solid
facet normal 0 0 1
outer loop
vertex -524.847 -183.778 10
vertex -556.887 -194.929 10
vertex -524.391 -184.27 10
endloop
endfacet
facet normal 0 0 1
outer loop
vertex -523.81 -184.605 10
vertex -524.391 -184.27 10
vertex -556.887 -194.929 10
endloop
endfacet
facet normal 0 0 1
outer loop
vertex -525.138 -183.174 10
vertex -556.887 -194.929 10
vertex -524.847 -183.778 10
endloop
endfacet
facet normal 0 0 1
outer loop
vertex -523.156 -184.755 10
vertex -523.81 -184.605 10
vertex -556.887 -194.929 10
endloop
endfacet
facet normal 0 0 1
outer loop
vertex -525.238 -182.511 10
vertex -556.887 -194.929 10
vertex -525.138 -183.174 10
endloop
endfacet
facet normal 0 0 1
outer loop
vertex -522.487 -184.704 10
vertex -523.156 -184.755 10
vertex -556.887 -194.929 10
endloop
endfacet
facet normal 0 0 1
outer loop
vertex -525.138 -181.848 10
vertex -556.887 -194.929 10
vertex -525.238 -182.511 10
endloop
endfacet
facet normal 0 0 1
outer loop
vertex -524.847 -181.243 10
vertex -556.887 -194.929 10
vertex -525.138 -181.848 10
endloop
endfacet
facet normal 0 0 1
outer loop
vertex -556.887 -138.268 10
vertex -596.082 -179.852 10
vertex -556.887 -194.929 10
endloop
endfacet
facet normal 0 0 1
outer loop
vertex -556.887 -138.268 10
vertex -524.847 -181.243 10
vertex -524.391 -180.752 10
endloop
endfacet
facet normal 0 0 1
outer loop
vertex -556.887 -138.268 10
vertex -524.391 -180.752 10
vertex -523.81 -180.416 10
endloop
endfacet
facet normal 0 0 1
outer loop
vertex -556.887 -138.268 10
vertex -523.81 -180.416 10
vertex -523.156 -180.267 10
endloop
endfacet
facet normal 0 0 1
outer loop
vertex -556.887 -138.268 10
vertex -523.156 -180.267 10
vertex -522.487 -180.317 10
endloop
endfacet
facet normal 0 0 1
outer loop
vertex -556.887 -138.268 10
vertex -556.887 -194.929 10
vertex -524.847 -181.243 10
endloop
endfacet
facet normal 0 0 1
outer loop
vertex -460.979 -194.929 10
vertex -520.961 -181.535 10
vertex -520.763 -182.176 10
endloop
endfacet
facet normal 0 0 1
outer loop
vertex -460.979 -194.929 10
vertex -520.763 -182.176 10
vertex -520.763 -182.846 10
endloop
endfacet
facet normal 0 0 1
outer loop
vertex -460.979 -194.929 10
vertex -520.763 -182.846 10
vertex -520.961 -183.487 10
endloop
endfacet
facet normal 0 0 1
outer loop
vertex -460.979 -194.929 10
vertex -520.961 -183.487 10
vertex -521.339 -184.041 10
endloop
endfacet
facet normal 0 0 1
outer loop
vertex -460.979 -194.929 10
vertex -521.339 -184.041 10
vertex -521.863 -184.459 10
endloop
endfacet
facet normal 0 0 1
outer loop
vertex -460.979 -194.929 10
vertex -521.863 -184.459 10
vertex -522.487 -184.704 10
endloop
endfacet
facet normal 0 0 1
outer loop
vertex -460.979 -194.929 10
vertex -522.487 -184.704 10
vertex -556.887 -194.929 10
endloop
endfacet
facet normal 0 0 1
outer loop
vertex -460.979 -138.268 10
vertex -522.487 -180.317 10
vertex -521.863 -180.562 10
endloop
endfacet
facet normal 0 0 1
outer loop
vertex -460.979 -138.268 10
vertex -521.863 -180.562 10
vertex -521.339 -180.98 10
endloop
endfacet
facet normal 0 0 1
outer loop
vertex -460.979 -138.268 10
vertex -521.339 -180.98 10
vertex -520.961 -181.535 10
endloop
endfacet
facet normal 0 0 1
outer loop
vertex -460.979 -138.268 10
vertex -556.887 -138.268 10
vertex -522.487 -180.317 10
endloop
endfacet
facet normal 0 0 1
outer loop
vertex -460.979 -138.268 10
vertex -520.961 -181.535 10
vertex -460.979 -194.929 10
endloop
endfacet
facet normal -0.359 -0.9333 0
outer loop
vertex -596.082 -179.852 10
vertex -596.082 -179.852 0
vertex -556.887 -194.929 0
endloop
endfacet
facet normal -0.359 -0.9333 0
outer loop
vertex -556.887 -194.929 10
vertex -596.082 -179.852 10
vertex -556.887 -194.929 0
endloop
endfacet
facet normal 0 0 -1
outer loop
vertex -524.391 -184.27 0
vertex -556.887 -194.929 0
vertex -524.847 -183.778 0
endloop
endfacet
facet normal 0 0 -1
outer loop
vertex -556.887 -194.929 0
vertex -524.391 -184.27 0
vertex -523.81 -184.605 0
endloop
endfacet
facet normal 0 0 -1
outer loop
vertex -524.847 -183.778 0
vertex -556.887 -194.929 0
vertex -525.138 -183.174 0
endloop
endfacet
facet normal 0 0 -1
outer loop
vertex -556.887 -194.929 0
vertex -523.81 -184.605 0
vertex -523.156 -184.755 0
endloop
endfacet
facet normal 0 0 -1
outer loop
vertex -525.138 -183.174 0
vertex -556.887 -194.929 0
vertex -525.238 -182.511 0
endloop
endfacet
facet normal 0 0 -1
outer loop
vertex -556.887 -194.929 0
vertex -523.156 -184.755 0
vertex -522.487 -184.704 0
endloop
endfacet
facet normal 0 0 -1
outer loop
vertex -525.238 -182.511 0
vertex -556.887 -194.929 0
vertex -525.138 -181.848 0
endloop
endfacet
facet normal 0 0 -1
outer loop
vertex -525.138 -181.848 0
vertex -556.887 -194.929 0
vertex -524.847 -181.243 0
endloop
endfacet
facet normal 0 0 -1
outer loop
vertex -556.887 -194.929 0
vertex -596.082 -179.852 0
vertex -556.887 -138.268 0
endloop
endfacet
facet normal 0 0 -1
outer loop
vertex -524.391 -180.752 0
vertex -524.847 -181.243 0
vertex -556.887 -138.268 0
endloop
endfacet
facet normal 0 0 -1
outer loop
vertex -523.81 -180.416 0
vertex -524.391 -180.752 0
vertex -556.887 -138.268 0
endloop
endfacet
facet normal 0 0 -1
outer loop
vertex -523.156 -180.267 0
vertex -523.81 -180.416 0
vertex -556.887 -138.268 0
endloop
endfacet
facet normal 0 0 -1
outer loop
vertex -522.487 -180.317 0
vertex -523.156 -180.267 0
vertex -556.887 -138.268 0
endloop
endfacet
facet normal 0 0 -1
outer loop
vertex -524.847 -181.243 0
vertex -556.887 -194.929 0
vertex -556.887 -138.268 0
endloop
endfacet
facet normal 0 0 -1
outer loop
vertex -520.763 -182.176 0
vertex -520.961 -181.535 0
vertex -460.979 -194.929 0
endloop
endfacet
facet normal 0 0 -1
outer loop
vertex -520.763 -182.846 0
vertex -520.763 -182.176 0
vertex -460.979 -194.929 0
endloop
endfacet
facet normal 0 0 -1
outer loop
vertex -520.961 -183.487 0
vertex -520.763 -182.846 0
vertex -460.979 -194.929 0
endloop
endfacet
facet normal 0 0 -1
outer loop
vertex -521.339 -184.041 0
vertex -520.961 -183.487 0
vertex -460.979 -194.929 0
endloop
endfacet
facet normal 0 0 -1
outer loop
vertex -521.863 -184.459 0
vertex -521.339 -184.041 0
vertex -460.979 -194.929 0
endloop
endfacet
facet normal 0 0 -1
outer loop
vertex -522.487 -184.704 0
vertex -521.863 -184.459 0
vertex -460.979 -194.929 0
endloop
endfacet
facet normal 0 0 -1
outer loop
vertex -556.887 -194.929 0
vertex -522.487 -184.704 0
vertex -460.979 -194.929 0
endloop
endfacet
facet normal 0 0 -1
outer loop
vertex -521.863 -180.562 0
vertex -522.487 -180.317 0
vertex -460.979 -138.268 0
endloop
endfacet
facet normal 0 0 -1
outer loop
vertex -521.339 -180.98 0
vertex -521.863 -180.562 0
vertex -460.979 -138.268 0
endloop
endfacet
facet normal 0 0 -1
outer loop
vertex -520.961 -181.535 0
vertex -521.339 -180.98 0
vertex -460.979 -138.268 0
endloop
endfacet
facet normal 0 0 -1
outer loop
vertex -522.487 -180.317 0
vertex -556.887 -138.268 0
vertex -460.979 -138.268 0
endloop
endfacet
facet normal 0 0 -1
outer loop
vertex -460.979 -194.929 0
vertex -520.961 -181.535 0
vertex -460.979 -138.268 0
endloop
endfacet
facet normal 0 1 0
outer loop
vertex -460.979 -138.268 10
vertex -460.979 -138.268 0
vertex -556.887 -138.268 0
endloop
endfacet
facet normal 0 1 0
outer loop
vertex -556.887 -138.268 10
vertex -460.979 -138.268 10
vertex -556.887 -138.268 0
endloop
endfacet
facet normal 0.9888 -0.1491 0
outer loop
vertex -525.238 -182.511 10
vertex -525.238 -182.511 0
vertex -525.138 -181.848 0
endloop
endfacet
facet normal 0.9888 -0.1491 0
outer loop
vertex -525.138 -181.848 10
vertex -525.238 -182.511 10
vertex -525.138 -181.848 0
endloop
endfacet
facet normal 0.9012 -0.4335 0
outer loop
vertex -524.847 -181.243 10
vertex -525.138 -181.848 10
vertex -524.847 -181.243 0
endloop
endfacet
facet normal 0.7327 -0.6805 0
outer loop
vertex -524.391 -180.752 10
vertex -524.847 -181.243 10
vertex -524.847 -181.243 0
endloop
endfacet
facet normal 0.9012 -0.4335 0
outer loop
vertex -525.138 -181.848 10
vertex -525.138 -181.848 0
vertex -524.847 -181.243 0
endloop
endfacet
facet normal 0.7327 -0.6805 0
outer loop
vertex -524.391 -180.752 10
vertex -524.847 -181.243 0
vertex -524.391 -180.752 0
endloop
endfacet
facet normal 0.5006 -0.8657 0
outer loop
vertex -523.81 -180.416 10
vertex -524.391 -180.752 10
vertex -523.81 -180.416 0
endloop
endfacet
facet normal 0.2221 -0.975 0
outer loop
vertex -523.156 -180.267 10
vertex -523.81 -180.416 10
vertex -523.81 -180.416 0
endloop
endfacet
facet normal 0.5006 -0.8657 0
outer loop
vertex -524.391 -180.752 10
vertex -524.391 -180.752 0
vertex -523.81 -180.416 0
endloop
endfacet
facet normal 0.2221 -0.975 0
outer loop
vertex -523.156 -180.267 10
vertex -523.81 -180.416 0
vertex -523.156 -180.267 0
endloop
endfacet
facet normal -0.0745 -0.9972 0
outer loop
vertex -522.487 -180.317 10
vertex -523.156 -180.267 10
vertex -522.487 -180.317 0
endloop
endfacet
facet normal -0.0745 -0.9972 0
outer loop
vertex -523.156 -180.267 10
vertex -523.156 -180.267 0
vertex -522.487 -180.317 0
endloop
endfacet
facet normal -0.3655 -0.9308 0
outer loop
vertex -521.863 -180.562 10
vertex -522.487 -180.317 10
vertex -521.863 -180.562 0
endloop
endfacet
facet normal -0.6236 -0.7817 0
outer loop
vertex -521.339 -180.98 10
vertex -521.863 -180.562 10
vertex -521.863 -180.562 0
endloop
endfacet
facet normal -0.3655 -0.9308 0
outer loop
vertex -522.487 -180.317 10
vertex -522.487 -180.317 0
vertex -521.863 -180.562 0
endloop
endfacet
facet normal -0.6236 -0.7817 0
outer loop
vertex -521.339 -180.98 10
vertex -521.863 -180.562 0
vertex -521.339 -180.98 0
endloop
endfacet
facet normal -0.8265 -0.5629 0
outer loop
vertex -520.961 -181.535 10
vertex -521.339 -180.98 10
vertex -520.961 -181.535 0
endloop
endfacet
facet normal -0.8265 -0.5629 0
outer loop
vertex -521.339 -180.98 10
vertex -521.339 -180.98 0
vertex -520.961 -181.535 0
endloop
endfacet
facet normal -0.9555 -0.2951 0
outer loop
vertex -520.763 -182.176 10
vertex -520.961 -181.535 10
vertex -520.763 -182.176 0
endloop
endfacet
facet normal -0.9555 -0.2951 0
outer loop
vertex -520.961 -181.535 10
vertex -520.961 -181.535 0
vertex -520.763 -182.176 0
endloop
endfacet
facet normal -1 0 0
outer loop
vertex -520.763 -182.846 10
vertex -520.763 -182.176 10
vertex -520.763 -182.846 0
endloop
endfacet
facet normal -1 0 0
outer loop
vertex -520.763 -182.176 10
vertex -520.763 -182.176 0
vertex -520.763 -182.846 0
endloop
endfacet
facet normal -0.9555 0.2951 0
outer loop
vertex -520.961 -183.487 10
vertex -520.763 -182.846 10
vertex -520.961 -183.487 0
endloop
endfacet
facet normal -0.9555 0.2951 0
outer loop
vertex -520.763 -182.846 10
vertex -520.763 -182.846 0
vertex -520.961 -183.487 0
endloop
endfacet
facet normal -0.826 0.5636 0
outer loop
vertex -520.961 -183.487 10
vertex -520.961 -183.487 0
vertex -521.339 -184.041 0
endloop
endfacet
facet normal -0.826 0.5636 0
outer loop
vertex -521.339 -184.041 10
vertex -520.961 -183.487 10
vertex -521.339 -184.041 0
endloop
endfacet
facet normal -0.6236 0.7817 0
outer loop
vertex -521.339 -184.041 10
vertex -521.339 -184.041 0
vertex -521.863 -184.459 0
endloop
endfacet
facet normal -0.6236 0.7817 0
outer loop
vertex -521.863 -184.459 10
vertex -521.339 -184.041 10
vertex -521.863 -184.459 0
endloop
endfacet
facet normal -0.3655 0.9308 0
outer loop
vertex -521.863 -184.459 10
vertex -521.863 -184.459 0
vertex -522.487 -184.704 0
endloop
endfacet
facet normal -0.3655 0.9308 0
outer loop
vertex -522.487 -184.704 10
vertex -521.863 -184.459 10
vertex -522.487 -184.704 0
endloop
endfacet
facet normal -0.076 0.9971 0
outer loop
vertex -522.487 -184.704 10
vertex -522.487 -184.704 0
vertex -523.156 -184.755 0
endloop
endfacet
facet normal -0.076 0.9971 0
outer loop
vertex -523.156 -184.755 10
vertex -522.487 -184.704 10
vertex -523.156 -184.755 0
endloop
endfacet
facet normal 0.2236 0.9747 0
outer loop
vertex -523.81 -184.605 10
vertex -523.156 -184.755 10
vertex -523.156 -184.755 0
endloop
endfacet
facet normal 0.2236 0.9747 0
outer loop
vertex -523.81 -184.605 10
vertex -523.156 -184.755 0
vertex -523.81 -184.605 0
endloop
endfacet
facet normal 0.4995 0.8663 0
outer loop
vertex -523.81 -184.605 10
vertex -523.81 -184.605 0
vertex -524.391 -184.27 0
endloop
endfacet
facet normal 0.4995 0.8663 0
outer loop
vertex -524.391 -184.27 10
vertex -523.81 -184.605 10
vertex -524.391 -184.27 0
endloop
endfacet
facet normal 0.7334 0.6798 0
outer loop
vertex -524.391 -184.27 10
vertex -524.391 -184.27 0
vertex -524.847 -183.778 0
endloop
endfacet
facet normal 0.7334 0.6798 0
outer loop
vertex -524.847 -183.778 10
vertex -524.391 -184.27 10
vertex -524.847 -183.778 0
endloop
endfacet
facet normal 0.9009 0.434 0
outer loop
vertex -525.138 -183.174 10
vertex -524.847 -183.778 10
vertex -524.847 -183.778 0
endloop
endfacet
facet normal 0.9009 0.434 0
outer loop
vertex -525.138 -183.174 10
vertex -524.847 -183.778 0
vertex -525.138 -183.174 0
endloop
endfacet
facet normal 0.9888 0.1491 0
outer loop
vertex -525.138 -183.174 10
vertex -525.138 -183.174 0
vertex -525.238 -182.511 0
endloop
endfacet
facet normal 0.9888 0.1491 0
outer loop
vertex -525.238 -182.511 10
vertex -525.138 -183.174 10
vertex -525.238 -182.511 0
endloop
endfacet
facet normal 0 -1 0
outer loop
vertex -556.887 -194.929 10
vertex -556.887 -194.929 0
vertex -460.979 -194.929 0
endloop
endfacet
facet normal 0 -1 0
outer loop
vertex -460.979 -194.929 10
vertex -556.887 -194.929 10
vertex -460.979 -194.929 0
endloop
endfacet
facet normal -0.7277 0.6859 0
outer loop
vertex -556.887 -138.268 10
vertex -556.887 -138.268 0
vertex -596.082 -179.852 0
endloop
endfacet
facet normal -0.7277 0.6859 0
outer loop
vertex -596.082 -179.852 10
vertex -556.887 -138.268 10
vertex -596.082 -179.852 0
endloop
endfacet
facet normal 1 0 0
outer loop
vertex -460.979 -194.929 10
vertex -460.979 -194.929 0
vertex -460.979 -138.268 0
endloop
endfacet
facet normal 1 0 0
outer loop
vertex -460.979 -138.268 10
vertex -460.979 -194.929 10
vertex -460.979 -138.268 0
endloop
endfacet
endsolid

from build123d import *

# Parameters (mm, degrees)
BOSS_EXTRU_1_DEPTH = 10
D_GAGEMENT_M41_D   = 4.5


with BuildPart() as part:
    # ref externes (internes) → Boss.-Extru.1 (new body)
    with BuildSketch(Plane.XY):
        Polygon((-460.979412649, -138.268279633), (-556.886836405, -138.268279633), (-596.082218437, -179.852321051), (-556.886836405, -194.929034048), (-460.979412649, -194.929034048), align=None)
    extrude(amount=BOSS_EXTRU_1_DEPTH)

    # Dégagement M41 (through all)
    with Locations(Plane.XY.offset(10)):
        with Locations((-522.988022529, -182.510884742)):
            Hole(D_GAGEMENT_M41_D / 2)


solid = part.part
